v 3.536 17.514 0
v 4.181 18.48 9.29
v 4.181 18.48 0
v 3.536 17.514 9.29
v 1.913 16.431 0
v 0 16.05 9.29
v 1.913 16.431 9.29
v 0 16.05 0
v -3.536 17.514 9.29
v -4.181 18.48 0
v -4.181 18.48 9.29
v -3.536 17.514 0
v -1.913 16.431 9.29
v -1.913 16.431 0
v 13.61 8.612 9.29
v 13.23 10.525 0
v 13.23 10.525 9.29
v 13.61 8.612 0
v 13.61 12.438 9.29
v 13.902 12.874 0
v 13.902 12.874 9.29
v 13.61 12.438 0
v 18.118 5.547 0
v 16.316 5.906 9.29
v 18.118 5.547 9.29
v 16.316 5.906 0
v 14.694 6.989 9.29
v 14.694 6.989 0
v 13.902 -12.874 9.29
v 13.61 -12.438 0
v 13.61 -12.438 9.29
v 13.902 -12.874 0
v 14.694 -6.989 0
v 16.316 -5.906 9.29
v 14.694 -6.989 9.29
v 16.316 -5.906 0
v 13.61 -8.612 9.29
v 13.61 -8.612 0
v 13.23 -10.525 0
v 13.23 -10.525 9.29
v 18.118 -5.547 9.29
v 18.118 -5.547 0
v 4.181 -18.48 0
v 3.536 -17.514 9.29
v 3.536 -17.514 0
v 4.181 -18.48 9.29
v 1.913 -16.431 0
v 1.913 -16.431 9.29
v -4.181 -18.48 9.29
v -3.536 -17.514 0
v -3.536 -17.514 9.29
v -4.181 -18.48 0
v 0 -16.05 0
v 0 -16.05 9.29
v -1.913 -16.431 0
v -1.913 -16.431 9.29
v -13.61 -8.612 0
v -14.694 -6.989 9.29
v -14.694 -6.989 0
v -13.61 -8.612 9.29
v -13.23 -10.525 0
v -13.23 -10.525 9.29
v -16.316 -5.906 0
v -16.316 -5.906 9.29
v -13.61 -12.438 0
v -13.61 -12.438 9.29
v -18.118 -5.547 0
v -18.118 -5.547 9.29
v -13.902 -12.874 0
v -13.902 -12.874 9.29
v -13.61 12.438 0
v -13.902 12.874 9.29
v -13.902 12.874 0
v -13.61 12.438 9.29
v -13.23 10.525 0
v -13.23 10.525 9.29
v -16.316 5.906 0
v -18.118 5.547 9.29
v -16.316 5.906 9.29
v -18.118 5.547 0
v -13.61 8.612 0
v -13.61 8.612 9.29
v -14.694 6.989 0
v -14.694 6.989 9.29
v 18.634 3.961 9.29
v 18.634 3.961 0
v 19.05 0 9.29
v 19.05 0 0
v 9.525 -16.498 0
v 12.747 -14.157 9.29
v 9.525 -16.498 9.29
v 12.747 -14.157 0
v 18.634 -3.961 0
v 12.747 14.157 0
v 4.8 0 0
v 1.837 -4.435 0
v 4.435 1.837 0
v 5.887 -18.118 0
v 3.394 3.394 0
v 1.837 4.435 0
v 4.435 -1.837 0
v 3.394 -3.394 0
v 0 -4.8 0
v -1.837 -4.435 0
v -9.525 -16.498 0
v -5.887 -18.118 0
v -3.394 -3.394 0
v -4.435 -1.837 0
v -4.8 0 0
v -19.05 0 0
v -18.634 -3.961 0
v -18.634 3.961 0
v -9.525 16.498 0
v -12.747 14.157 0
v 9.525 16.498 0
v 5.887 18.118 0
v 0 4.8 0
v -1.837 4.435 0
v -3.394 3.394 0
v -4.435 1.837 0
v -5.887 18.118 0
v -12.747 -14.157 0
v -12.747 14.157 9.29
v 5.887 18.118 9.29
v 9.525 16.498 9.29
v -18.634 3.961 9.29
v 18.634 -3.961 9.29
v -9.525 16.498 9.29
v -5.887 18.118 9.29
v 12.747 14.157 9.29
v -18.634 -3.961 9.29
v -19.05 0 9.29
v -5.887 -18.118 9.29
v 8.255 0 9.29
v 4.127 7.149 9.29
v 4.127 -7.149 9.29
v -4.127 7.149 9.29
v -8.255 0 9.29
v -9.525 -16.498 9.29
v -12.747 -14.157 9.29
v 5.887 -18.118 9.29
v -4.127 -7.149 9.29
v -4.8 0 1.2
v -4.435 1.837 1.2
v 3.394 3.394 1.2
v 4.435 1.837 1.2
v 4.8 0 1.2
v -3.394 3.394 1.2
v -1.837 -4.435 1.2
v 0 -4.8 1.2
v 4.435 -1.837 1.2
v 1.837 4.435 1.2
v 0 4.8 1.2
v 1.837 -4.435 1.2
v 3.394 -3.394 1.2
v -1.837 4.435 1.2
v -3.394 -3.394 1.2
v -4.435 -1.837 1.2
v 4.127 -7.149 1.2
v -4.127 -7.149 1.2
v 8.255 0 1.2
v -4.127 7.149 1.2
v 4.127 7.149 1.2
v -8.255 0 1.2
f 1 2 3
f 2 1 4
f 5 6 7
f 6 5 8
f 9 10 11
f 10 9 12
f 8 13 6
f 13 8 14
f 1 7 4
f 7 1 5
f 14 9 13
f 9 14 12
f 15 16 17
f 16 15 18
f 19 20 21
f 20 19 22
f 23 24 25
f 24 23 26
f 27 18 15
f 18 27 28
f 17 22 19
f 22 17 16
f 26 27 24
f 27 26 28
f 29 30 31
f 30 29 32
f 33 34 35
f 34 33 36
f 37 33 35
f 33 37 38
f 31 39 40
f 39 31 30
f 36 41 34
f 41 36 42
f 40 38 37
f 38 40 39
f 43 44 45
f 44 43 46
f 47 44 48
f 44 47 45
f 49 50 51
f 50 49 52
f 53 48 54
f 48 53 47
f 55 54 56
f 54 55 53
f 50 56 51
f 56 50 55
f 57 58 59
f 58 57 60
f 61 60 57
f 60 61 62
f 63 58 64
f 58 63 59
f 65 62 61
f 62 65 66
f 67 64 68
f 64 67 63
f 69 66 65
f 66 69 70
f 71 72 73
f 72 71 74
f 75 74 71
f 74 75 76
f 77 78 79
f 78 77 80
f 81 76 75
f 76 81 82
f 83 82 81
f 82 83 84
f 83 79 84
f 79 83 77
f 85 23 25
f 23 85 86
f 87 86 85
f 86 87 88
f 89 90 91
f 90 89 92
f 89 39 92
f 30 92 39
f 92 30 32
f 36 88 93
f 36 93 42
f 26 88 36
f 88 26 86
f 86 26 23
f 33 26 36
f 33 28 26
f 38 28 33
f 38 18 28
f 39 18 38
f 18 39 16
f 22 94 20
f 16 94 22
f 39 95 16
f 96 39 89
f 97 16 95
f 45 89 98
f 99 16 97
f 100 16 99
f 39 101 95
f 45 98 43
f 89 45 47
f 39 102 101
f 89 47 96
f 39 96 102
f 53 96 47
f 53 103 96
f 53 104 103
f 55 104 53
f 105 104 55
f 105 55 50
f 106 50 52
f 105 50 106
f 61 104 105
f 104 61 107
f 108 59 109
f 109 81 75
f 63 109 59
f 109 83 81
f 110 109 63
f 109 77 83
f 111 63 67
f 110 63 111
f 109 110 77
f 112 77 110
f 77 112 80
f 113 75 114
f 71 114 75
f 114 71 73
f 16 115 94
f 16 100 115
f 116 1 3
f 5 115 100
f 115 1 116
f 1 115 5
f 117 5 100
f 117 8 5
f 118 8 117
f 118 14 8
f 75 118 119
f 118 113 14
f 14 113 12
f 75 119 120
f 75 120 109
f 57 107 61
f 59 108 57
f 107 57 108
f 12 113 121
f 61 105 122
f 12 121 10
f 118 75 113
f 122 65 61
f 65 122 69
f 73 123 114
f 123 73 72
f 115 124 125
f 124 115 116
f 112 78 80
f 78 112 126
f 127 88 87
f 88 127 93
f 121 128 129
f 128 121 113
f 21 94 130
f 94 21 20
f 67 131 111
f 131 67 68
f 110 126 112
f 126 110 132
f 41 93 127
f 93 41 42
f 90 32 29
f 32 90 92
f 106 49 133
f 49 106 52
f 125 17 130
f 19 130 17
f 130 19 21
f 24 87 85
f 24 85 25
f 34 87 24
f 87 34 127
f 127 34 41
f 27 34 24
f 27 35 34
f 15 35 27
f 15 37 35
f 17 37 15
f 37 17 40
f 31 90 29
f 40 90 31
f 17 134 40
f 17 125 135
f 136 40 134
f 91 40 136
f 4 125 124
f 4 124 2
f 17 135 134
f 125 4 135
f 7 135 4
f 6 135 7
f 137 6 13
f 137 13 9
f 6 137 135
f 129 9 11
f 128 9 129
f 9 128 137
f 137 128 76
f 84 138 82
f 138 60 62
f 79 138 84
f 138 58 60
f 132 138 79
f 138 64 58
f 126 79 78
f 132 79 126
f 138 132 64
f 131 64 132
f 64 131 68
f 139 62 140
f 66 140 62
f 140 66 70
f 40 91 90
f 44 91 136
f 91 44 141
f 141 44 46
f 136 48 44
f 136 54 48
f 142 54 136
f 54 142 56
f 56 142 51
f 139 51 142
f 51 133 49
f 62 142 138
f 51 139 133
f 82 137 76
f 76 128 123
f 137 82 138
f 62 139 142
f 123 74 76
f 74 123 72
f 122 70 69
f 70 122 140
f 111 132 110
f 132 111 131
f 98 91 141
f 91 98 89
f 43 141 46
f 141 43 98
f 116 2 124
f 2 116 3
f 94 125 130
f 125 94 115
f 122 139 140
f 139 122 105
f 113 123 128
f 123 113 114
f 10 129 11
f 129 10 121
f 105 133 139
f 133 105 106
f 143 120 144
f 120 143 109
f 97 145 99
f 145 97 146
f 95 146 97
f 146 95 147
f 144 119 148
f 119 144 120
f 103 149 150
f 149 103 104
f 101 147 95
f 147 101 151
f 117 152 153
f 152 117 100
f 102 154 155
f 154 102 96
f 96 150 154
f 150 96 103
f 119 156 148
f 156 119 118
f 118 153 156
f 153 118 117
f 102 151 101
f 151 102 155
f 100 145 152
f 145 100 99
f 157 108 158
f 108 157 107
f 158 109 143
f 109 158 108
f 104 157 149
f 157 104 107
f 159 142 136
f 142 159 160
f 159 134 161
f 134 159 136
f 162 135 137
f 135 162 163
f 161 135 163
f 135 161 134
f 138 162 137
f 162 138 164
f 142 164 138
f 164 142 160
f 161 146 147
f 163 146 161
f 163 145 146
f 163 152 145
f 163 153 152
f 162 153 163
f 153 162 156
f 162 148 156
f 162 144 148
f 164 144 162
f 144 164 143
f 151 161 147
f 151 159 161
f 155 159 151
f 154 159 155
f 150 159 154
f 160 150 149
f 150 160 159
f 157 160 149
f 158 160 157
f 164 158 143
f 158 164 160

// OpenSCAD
/*

Parametric knob generator
by Gian Pablo Villamil
May 2011

Makes knurled knobs that accomodate a nut in the middle, useful for things
like camera mounts.

version for 3/8 inch nut

*/

knob_radius = 19.05;
dent_radius = 5;
knob_height = 9.29;
num_dents = 6;
dent_offset = 2;

nut_hole_radius = 4.8; // half of 1/4 inch in millimeters
nut_size_radius = 8.255; // point to point size of nut

module knob()
{
	translate([0, 0, 0]) {
		difference() {
		cylinder(h = knob_height, r = knob_radius);
		for (i = [0:(num_dents - 1)]) {
			translate([sin(360*i/num_dents)*(knob_radius+dent_offset), cos(360*i/num_dents)*(knob_radius+dent_offset), -5 ])
			cylinder(h = knob_height+10, r=dent_radius);
			}
		translate([0,0,-5]) cylinder(h = knob_height+10, r=nut_hole_radius,$fa=10);
		translate([0,0,1.2]) cylinder(h = knob_height+10, r=nut_size_radius,$fa=60);
		}
	}
}

knob();
